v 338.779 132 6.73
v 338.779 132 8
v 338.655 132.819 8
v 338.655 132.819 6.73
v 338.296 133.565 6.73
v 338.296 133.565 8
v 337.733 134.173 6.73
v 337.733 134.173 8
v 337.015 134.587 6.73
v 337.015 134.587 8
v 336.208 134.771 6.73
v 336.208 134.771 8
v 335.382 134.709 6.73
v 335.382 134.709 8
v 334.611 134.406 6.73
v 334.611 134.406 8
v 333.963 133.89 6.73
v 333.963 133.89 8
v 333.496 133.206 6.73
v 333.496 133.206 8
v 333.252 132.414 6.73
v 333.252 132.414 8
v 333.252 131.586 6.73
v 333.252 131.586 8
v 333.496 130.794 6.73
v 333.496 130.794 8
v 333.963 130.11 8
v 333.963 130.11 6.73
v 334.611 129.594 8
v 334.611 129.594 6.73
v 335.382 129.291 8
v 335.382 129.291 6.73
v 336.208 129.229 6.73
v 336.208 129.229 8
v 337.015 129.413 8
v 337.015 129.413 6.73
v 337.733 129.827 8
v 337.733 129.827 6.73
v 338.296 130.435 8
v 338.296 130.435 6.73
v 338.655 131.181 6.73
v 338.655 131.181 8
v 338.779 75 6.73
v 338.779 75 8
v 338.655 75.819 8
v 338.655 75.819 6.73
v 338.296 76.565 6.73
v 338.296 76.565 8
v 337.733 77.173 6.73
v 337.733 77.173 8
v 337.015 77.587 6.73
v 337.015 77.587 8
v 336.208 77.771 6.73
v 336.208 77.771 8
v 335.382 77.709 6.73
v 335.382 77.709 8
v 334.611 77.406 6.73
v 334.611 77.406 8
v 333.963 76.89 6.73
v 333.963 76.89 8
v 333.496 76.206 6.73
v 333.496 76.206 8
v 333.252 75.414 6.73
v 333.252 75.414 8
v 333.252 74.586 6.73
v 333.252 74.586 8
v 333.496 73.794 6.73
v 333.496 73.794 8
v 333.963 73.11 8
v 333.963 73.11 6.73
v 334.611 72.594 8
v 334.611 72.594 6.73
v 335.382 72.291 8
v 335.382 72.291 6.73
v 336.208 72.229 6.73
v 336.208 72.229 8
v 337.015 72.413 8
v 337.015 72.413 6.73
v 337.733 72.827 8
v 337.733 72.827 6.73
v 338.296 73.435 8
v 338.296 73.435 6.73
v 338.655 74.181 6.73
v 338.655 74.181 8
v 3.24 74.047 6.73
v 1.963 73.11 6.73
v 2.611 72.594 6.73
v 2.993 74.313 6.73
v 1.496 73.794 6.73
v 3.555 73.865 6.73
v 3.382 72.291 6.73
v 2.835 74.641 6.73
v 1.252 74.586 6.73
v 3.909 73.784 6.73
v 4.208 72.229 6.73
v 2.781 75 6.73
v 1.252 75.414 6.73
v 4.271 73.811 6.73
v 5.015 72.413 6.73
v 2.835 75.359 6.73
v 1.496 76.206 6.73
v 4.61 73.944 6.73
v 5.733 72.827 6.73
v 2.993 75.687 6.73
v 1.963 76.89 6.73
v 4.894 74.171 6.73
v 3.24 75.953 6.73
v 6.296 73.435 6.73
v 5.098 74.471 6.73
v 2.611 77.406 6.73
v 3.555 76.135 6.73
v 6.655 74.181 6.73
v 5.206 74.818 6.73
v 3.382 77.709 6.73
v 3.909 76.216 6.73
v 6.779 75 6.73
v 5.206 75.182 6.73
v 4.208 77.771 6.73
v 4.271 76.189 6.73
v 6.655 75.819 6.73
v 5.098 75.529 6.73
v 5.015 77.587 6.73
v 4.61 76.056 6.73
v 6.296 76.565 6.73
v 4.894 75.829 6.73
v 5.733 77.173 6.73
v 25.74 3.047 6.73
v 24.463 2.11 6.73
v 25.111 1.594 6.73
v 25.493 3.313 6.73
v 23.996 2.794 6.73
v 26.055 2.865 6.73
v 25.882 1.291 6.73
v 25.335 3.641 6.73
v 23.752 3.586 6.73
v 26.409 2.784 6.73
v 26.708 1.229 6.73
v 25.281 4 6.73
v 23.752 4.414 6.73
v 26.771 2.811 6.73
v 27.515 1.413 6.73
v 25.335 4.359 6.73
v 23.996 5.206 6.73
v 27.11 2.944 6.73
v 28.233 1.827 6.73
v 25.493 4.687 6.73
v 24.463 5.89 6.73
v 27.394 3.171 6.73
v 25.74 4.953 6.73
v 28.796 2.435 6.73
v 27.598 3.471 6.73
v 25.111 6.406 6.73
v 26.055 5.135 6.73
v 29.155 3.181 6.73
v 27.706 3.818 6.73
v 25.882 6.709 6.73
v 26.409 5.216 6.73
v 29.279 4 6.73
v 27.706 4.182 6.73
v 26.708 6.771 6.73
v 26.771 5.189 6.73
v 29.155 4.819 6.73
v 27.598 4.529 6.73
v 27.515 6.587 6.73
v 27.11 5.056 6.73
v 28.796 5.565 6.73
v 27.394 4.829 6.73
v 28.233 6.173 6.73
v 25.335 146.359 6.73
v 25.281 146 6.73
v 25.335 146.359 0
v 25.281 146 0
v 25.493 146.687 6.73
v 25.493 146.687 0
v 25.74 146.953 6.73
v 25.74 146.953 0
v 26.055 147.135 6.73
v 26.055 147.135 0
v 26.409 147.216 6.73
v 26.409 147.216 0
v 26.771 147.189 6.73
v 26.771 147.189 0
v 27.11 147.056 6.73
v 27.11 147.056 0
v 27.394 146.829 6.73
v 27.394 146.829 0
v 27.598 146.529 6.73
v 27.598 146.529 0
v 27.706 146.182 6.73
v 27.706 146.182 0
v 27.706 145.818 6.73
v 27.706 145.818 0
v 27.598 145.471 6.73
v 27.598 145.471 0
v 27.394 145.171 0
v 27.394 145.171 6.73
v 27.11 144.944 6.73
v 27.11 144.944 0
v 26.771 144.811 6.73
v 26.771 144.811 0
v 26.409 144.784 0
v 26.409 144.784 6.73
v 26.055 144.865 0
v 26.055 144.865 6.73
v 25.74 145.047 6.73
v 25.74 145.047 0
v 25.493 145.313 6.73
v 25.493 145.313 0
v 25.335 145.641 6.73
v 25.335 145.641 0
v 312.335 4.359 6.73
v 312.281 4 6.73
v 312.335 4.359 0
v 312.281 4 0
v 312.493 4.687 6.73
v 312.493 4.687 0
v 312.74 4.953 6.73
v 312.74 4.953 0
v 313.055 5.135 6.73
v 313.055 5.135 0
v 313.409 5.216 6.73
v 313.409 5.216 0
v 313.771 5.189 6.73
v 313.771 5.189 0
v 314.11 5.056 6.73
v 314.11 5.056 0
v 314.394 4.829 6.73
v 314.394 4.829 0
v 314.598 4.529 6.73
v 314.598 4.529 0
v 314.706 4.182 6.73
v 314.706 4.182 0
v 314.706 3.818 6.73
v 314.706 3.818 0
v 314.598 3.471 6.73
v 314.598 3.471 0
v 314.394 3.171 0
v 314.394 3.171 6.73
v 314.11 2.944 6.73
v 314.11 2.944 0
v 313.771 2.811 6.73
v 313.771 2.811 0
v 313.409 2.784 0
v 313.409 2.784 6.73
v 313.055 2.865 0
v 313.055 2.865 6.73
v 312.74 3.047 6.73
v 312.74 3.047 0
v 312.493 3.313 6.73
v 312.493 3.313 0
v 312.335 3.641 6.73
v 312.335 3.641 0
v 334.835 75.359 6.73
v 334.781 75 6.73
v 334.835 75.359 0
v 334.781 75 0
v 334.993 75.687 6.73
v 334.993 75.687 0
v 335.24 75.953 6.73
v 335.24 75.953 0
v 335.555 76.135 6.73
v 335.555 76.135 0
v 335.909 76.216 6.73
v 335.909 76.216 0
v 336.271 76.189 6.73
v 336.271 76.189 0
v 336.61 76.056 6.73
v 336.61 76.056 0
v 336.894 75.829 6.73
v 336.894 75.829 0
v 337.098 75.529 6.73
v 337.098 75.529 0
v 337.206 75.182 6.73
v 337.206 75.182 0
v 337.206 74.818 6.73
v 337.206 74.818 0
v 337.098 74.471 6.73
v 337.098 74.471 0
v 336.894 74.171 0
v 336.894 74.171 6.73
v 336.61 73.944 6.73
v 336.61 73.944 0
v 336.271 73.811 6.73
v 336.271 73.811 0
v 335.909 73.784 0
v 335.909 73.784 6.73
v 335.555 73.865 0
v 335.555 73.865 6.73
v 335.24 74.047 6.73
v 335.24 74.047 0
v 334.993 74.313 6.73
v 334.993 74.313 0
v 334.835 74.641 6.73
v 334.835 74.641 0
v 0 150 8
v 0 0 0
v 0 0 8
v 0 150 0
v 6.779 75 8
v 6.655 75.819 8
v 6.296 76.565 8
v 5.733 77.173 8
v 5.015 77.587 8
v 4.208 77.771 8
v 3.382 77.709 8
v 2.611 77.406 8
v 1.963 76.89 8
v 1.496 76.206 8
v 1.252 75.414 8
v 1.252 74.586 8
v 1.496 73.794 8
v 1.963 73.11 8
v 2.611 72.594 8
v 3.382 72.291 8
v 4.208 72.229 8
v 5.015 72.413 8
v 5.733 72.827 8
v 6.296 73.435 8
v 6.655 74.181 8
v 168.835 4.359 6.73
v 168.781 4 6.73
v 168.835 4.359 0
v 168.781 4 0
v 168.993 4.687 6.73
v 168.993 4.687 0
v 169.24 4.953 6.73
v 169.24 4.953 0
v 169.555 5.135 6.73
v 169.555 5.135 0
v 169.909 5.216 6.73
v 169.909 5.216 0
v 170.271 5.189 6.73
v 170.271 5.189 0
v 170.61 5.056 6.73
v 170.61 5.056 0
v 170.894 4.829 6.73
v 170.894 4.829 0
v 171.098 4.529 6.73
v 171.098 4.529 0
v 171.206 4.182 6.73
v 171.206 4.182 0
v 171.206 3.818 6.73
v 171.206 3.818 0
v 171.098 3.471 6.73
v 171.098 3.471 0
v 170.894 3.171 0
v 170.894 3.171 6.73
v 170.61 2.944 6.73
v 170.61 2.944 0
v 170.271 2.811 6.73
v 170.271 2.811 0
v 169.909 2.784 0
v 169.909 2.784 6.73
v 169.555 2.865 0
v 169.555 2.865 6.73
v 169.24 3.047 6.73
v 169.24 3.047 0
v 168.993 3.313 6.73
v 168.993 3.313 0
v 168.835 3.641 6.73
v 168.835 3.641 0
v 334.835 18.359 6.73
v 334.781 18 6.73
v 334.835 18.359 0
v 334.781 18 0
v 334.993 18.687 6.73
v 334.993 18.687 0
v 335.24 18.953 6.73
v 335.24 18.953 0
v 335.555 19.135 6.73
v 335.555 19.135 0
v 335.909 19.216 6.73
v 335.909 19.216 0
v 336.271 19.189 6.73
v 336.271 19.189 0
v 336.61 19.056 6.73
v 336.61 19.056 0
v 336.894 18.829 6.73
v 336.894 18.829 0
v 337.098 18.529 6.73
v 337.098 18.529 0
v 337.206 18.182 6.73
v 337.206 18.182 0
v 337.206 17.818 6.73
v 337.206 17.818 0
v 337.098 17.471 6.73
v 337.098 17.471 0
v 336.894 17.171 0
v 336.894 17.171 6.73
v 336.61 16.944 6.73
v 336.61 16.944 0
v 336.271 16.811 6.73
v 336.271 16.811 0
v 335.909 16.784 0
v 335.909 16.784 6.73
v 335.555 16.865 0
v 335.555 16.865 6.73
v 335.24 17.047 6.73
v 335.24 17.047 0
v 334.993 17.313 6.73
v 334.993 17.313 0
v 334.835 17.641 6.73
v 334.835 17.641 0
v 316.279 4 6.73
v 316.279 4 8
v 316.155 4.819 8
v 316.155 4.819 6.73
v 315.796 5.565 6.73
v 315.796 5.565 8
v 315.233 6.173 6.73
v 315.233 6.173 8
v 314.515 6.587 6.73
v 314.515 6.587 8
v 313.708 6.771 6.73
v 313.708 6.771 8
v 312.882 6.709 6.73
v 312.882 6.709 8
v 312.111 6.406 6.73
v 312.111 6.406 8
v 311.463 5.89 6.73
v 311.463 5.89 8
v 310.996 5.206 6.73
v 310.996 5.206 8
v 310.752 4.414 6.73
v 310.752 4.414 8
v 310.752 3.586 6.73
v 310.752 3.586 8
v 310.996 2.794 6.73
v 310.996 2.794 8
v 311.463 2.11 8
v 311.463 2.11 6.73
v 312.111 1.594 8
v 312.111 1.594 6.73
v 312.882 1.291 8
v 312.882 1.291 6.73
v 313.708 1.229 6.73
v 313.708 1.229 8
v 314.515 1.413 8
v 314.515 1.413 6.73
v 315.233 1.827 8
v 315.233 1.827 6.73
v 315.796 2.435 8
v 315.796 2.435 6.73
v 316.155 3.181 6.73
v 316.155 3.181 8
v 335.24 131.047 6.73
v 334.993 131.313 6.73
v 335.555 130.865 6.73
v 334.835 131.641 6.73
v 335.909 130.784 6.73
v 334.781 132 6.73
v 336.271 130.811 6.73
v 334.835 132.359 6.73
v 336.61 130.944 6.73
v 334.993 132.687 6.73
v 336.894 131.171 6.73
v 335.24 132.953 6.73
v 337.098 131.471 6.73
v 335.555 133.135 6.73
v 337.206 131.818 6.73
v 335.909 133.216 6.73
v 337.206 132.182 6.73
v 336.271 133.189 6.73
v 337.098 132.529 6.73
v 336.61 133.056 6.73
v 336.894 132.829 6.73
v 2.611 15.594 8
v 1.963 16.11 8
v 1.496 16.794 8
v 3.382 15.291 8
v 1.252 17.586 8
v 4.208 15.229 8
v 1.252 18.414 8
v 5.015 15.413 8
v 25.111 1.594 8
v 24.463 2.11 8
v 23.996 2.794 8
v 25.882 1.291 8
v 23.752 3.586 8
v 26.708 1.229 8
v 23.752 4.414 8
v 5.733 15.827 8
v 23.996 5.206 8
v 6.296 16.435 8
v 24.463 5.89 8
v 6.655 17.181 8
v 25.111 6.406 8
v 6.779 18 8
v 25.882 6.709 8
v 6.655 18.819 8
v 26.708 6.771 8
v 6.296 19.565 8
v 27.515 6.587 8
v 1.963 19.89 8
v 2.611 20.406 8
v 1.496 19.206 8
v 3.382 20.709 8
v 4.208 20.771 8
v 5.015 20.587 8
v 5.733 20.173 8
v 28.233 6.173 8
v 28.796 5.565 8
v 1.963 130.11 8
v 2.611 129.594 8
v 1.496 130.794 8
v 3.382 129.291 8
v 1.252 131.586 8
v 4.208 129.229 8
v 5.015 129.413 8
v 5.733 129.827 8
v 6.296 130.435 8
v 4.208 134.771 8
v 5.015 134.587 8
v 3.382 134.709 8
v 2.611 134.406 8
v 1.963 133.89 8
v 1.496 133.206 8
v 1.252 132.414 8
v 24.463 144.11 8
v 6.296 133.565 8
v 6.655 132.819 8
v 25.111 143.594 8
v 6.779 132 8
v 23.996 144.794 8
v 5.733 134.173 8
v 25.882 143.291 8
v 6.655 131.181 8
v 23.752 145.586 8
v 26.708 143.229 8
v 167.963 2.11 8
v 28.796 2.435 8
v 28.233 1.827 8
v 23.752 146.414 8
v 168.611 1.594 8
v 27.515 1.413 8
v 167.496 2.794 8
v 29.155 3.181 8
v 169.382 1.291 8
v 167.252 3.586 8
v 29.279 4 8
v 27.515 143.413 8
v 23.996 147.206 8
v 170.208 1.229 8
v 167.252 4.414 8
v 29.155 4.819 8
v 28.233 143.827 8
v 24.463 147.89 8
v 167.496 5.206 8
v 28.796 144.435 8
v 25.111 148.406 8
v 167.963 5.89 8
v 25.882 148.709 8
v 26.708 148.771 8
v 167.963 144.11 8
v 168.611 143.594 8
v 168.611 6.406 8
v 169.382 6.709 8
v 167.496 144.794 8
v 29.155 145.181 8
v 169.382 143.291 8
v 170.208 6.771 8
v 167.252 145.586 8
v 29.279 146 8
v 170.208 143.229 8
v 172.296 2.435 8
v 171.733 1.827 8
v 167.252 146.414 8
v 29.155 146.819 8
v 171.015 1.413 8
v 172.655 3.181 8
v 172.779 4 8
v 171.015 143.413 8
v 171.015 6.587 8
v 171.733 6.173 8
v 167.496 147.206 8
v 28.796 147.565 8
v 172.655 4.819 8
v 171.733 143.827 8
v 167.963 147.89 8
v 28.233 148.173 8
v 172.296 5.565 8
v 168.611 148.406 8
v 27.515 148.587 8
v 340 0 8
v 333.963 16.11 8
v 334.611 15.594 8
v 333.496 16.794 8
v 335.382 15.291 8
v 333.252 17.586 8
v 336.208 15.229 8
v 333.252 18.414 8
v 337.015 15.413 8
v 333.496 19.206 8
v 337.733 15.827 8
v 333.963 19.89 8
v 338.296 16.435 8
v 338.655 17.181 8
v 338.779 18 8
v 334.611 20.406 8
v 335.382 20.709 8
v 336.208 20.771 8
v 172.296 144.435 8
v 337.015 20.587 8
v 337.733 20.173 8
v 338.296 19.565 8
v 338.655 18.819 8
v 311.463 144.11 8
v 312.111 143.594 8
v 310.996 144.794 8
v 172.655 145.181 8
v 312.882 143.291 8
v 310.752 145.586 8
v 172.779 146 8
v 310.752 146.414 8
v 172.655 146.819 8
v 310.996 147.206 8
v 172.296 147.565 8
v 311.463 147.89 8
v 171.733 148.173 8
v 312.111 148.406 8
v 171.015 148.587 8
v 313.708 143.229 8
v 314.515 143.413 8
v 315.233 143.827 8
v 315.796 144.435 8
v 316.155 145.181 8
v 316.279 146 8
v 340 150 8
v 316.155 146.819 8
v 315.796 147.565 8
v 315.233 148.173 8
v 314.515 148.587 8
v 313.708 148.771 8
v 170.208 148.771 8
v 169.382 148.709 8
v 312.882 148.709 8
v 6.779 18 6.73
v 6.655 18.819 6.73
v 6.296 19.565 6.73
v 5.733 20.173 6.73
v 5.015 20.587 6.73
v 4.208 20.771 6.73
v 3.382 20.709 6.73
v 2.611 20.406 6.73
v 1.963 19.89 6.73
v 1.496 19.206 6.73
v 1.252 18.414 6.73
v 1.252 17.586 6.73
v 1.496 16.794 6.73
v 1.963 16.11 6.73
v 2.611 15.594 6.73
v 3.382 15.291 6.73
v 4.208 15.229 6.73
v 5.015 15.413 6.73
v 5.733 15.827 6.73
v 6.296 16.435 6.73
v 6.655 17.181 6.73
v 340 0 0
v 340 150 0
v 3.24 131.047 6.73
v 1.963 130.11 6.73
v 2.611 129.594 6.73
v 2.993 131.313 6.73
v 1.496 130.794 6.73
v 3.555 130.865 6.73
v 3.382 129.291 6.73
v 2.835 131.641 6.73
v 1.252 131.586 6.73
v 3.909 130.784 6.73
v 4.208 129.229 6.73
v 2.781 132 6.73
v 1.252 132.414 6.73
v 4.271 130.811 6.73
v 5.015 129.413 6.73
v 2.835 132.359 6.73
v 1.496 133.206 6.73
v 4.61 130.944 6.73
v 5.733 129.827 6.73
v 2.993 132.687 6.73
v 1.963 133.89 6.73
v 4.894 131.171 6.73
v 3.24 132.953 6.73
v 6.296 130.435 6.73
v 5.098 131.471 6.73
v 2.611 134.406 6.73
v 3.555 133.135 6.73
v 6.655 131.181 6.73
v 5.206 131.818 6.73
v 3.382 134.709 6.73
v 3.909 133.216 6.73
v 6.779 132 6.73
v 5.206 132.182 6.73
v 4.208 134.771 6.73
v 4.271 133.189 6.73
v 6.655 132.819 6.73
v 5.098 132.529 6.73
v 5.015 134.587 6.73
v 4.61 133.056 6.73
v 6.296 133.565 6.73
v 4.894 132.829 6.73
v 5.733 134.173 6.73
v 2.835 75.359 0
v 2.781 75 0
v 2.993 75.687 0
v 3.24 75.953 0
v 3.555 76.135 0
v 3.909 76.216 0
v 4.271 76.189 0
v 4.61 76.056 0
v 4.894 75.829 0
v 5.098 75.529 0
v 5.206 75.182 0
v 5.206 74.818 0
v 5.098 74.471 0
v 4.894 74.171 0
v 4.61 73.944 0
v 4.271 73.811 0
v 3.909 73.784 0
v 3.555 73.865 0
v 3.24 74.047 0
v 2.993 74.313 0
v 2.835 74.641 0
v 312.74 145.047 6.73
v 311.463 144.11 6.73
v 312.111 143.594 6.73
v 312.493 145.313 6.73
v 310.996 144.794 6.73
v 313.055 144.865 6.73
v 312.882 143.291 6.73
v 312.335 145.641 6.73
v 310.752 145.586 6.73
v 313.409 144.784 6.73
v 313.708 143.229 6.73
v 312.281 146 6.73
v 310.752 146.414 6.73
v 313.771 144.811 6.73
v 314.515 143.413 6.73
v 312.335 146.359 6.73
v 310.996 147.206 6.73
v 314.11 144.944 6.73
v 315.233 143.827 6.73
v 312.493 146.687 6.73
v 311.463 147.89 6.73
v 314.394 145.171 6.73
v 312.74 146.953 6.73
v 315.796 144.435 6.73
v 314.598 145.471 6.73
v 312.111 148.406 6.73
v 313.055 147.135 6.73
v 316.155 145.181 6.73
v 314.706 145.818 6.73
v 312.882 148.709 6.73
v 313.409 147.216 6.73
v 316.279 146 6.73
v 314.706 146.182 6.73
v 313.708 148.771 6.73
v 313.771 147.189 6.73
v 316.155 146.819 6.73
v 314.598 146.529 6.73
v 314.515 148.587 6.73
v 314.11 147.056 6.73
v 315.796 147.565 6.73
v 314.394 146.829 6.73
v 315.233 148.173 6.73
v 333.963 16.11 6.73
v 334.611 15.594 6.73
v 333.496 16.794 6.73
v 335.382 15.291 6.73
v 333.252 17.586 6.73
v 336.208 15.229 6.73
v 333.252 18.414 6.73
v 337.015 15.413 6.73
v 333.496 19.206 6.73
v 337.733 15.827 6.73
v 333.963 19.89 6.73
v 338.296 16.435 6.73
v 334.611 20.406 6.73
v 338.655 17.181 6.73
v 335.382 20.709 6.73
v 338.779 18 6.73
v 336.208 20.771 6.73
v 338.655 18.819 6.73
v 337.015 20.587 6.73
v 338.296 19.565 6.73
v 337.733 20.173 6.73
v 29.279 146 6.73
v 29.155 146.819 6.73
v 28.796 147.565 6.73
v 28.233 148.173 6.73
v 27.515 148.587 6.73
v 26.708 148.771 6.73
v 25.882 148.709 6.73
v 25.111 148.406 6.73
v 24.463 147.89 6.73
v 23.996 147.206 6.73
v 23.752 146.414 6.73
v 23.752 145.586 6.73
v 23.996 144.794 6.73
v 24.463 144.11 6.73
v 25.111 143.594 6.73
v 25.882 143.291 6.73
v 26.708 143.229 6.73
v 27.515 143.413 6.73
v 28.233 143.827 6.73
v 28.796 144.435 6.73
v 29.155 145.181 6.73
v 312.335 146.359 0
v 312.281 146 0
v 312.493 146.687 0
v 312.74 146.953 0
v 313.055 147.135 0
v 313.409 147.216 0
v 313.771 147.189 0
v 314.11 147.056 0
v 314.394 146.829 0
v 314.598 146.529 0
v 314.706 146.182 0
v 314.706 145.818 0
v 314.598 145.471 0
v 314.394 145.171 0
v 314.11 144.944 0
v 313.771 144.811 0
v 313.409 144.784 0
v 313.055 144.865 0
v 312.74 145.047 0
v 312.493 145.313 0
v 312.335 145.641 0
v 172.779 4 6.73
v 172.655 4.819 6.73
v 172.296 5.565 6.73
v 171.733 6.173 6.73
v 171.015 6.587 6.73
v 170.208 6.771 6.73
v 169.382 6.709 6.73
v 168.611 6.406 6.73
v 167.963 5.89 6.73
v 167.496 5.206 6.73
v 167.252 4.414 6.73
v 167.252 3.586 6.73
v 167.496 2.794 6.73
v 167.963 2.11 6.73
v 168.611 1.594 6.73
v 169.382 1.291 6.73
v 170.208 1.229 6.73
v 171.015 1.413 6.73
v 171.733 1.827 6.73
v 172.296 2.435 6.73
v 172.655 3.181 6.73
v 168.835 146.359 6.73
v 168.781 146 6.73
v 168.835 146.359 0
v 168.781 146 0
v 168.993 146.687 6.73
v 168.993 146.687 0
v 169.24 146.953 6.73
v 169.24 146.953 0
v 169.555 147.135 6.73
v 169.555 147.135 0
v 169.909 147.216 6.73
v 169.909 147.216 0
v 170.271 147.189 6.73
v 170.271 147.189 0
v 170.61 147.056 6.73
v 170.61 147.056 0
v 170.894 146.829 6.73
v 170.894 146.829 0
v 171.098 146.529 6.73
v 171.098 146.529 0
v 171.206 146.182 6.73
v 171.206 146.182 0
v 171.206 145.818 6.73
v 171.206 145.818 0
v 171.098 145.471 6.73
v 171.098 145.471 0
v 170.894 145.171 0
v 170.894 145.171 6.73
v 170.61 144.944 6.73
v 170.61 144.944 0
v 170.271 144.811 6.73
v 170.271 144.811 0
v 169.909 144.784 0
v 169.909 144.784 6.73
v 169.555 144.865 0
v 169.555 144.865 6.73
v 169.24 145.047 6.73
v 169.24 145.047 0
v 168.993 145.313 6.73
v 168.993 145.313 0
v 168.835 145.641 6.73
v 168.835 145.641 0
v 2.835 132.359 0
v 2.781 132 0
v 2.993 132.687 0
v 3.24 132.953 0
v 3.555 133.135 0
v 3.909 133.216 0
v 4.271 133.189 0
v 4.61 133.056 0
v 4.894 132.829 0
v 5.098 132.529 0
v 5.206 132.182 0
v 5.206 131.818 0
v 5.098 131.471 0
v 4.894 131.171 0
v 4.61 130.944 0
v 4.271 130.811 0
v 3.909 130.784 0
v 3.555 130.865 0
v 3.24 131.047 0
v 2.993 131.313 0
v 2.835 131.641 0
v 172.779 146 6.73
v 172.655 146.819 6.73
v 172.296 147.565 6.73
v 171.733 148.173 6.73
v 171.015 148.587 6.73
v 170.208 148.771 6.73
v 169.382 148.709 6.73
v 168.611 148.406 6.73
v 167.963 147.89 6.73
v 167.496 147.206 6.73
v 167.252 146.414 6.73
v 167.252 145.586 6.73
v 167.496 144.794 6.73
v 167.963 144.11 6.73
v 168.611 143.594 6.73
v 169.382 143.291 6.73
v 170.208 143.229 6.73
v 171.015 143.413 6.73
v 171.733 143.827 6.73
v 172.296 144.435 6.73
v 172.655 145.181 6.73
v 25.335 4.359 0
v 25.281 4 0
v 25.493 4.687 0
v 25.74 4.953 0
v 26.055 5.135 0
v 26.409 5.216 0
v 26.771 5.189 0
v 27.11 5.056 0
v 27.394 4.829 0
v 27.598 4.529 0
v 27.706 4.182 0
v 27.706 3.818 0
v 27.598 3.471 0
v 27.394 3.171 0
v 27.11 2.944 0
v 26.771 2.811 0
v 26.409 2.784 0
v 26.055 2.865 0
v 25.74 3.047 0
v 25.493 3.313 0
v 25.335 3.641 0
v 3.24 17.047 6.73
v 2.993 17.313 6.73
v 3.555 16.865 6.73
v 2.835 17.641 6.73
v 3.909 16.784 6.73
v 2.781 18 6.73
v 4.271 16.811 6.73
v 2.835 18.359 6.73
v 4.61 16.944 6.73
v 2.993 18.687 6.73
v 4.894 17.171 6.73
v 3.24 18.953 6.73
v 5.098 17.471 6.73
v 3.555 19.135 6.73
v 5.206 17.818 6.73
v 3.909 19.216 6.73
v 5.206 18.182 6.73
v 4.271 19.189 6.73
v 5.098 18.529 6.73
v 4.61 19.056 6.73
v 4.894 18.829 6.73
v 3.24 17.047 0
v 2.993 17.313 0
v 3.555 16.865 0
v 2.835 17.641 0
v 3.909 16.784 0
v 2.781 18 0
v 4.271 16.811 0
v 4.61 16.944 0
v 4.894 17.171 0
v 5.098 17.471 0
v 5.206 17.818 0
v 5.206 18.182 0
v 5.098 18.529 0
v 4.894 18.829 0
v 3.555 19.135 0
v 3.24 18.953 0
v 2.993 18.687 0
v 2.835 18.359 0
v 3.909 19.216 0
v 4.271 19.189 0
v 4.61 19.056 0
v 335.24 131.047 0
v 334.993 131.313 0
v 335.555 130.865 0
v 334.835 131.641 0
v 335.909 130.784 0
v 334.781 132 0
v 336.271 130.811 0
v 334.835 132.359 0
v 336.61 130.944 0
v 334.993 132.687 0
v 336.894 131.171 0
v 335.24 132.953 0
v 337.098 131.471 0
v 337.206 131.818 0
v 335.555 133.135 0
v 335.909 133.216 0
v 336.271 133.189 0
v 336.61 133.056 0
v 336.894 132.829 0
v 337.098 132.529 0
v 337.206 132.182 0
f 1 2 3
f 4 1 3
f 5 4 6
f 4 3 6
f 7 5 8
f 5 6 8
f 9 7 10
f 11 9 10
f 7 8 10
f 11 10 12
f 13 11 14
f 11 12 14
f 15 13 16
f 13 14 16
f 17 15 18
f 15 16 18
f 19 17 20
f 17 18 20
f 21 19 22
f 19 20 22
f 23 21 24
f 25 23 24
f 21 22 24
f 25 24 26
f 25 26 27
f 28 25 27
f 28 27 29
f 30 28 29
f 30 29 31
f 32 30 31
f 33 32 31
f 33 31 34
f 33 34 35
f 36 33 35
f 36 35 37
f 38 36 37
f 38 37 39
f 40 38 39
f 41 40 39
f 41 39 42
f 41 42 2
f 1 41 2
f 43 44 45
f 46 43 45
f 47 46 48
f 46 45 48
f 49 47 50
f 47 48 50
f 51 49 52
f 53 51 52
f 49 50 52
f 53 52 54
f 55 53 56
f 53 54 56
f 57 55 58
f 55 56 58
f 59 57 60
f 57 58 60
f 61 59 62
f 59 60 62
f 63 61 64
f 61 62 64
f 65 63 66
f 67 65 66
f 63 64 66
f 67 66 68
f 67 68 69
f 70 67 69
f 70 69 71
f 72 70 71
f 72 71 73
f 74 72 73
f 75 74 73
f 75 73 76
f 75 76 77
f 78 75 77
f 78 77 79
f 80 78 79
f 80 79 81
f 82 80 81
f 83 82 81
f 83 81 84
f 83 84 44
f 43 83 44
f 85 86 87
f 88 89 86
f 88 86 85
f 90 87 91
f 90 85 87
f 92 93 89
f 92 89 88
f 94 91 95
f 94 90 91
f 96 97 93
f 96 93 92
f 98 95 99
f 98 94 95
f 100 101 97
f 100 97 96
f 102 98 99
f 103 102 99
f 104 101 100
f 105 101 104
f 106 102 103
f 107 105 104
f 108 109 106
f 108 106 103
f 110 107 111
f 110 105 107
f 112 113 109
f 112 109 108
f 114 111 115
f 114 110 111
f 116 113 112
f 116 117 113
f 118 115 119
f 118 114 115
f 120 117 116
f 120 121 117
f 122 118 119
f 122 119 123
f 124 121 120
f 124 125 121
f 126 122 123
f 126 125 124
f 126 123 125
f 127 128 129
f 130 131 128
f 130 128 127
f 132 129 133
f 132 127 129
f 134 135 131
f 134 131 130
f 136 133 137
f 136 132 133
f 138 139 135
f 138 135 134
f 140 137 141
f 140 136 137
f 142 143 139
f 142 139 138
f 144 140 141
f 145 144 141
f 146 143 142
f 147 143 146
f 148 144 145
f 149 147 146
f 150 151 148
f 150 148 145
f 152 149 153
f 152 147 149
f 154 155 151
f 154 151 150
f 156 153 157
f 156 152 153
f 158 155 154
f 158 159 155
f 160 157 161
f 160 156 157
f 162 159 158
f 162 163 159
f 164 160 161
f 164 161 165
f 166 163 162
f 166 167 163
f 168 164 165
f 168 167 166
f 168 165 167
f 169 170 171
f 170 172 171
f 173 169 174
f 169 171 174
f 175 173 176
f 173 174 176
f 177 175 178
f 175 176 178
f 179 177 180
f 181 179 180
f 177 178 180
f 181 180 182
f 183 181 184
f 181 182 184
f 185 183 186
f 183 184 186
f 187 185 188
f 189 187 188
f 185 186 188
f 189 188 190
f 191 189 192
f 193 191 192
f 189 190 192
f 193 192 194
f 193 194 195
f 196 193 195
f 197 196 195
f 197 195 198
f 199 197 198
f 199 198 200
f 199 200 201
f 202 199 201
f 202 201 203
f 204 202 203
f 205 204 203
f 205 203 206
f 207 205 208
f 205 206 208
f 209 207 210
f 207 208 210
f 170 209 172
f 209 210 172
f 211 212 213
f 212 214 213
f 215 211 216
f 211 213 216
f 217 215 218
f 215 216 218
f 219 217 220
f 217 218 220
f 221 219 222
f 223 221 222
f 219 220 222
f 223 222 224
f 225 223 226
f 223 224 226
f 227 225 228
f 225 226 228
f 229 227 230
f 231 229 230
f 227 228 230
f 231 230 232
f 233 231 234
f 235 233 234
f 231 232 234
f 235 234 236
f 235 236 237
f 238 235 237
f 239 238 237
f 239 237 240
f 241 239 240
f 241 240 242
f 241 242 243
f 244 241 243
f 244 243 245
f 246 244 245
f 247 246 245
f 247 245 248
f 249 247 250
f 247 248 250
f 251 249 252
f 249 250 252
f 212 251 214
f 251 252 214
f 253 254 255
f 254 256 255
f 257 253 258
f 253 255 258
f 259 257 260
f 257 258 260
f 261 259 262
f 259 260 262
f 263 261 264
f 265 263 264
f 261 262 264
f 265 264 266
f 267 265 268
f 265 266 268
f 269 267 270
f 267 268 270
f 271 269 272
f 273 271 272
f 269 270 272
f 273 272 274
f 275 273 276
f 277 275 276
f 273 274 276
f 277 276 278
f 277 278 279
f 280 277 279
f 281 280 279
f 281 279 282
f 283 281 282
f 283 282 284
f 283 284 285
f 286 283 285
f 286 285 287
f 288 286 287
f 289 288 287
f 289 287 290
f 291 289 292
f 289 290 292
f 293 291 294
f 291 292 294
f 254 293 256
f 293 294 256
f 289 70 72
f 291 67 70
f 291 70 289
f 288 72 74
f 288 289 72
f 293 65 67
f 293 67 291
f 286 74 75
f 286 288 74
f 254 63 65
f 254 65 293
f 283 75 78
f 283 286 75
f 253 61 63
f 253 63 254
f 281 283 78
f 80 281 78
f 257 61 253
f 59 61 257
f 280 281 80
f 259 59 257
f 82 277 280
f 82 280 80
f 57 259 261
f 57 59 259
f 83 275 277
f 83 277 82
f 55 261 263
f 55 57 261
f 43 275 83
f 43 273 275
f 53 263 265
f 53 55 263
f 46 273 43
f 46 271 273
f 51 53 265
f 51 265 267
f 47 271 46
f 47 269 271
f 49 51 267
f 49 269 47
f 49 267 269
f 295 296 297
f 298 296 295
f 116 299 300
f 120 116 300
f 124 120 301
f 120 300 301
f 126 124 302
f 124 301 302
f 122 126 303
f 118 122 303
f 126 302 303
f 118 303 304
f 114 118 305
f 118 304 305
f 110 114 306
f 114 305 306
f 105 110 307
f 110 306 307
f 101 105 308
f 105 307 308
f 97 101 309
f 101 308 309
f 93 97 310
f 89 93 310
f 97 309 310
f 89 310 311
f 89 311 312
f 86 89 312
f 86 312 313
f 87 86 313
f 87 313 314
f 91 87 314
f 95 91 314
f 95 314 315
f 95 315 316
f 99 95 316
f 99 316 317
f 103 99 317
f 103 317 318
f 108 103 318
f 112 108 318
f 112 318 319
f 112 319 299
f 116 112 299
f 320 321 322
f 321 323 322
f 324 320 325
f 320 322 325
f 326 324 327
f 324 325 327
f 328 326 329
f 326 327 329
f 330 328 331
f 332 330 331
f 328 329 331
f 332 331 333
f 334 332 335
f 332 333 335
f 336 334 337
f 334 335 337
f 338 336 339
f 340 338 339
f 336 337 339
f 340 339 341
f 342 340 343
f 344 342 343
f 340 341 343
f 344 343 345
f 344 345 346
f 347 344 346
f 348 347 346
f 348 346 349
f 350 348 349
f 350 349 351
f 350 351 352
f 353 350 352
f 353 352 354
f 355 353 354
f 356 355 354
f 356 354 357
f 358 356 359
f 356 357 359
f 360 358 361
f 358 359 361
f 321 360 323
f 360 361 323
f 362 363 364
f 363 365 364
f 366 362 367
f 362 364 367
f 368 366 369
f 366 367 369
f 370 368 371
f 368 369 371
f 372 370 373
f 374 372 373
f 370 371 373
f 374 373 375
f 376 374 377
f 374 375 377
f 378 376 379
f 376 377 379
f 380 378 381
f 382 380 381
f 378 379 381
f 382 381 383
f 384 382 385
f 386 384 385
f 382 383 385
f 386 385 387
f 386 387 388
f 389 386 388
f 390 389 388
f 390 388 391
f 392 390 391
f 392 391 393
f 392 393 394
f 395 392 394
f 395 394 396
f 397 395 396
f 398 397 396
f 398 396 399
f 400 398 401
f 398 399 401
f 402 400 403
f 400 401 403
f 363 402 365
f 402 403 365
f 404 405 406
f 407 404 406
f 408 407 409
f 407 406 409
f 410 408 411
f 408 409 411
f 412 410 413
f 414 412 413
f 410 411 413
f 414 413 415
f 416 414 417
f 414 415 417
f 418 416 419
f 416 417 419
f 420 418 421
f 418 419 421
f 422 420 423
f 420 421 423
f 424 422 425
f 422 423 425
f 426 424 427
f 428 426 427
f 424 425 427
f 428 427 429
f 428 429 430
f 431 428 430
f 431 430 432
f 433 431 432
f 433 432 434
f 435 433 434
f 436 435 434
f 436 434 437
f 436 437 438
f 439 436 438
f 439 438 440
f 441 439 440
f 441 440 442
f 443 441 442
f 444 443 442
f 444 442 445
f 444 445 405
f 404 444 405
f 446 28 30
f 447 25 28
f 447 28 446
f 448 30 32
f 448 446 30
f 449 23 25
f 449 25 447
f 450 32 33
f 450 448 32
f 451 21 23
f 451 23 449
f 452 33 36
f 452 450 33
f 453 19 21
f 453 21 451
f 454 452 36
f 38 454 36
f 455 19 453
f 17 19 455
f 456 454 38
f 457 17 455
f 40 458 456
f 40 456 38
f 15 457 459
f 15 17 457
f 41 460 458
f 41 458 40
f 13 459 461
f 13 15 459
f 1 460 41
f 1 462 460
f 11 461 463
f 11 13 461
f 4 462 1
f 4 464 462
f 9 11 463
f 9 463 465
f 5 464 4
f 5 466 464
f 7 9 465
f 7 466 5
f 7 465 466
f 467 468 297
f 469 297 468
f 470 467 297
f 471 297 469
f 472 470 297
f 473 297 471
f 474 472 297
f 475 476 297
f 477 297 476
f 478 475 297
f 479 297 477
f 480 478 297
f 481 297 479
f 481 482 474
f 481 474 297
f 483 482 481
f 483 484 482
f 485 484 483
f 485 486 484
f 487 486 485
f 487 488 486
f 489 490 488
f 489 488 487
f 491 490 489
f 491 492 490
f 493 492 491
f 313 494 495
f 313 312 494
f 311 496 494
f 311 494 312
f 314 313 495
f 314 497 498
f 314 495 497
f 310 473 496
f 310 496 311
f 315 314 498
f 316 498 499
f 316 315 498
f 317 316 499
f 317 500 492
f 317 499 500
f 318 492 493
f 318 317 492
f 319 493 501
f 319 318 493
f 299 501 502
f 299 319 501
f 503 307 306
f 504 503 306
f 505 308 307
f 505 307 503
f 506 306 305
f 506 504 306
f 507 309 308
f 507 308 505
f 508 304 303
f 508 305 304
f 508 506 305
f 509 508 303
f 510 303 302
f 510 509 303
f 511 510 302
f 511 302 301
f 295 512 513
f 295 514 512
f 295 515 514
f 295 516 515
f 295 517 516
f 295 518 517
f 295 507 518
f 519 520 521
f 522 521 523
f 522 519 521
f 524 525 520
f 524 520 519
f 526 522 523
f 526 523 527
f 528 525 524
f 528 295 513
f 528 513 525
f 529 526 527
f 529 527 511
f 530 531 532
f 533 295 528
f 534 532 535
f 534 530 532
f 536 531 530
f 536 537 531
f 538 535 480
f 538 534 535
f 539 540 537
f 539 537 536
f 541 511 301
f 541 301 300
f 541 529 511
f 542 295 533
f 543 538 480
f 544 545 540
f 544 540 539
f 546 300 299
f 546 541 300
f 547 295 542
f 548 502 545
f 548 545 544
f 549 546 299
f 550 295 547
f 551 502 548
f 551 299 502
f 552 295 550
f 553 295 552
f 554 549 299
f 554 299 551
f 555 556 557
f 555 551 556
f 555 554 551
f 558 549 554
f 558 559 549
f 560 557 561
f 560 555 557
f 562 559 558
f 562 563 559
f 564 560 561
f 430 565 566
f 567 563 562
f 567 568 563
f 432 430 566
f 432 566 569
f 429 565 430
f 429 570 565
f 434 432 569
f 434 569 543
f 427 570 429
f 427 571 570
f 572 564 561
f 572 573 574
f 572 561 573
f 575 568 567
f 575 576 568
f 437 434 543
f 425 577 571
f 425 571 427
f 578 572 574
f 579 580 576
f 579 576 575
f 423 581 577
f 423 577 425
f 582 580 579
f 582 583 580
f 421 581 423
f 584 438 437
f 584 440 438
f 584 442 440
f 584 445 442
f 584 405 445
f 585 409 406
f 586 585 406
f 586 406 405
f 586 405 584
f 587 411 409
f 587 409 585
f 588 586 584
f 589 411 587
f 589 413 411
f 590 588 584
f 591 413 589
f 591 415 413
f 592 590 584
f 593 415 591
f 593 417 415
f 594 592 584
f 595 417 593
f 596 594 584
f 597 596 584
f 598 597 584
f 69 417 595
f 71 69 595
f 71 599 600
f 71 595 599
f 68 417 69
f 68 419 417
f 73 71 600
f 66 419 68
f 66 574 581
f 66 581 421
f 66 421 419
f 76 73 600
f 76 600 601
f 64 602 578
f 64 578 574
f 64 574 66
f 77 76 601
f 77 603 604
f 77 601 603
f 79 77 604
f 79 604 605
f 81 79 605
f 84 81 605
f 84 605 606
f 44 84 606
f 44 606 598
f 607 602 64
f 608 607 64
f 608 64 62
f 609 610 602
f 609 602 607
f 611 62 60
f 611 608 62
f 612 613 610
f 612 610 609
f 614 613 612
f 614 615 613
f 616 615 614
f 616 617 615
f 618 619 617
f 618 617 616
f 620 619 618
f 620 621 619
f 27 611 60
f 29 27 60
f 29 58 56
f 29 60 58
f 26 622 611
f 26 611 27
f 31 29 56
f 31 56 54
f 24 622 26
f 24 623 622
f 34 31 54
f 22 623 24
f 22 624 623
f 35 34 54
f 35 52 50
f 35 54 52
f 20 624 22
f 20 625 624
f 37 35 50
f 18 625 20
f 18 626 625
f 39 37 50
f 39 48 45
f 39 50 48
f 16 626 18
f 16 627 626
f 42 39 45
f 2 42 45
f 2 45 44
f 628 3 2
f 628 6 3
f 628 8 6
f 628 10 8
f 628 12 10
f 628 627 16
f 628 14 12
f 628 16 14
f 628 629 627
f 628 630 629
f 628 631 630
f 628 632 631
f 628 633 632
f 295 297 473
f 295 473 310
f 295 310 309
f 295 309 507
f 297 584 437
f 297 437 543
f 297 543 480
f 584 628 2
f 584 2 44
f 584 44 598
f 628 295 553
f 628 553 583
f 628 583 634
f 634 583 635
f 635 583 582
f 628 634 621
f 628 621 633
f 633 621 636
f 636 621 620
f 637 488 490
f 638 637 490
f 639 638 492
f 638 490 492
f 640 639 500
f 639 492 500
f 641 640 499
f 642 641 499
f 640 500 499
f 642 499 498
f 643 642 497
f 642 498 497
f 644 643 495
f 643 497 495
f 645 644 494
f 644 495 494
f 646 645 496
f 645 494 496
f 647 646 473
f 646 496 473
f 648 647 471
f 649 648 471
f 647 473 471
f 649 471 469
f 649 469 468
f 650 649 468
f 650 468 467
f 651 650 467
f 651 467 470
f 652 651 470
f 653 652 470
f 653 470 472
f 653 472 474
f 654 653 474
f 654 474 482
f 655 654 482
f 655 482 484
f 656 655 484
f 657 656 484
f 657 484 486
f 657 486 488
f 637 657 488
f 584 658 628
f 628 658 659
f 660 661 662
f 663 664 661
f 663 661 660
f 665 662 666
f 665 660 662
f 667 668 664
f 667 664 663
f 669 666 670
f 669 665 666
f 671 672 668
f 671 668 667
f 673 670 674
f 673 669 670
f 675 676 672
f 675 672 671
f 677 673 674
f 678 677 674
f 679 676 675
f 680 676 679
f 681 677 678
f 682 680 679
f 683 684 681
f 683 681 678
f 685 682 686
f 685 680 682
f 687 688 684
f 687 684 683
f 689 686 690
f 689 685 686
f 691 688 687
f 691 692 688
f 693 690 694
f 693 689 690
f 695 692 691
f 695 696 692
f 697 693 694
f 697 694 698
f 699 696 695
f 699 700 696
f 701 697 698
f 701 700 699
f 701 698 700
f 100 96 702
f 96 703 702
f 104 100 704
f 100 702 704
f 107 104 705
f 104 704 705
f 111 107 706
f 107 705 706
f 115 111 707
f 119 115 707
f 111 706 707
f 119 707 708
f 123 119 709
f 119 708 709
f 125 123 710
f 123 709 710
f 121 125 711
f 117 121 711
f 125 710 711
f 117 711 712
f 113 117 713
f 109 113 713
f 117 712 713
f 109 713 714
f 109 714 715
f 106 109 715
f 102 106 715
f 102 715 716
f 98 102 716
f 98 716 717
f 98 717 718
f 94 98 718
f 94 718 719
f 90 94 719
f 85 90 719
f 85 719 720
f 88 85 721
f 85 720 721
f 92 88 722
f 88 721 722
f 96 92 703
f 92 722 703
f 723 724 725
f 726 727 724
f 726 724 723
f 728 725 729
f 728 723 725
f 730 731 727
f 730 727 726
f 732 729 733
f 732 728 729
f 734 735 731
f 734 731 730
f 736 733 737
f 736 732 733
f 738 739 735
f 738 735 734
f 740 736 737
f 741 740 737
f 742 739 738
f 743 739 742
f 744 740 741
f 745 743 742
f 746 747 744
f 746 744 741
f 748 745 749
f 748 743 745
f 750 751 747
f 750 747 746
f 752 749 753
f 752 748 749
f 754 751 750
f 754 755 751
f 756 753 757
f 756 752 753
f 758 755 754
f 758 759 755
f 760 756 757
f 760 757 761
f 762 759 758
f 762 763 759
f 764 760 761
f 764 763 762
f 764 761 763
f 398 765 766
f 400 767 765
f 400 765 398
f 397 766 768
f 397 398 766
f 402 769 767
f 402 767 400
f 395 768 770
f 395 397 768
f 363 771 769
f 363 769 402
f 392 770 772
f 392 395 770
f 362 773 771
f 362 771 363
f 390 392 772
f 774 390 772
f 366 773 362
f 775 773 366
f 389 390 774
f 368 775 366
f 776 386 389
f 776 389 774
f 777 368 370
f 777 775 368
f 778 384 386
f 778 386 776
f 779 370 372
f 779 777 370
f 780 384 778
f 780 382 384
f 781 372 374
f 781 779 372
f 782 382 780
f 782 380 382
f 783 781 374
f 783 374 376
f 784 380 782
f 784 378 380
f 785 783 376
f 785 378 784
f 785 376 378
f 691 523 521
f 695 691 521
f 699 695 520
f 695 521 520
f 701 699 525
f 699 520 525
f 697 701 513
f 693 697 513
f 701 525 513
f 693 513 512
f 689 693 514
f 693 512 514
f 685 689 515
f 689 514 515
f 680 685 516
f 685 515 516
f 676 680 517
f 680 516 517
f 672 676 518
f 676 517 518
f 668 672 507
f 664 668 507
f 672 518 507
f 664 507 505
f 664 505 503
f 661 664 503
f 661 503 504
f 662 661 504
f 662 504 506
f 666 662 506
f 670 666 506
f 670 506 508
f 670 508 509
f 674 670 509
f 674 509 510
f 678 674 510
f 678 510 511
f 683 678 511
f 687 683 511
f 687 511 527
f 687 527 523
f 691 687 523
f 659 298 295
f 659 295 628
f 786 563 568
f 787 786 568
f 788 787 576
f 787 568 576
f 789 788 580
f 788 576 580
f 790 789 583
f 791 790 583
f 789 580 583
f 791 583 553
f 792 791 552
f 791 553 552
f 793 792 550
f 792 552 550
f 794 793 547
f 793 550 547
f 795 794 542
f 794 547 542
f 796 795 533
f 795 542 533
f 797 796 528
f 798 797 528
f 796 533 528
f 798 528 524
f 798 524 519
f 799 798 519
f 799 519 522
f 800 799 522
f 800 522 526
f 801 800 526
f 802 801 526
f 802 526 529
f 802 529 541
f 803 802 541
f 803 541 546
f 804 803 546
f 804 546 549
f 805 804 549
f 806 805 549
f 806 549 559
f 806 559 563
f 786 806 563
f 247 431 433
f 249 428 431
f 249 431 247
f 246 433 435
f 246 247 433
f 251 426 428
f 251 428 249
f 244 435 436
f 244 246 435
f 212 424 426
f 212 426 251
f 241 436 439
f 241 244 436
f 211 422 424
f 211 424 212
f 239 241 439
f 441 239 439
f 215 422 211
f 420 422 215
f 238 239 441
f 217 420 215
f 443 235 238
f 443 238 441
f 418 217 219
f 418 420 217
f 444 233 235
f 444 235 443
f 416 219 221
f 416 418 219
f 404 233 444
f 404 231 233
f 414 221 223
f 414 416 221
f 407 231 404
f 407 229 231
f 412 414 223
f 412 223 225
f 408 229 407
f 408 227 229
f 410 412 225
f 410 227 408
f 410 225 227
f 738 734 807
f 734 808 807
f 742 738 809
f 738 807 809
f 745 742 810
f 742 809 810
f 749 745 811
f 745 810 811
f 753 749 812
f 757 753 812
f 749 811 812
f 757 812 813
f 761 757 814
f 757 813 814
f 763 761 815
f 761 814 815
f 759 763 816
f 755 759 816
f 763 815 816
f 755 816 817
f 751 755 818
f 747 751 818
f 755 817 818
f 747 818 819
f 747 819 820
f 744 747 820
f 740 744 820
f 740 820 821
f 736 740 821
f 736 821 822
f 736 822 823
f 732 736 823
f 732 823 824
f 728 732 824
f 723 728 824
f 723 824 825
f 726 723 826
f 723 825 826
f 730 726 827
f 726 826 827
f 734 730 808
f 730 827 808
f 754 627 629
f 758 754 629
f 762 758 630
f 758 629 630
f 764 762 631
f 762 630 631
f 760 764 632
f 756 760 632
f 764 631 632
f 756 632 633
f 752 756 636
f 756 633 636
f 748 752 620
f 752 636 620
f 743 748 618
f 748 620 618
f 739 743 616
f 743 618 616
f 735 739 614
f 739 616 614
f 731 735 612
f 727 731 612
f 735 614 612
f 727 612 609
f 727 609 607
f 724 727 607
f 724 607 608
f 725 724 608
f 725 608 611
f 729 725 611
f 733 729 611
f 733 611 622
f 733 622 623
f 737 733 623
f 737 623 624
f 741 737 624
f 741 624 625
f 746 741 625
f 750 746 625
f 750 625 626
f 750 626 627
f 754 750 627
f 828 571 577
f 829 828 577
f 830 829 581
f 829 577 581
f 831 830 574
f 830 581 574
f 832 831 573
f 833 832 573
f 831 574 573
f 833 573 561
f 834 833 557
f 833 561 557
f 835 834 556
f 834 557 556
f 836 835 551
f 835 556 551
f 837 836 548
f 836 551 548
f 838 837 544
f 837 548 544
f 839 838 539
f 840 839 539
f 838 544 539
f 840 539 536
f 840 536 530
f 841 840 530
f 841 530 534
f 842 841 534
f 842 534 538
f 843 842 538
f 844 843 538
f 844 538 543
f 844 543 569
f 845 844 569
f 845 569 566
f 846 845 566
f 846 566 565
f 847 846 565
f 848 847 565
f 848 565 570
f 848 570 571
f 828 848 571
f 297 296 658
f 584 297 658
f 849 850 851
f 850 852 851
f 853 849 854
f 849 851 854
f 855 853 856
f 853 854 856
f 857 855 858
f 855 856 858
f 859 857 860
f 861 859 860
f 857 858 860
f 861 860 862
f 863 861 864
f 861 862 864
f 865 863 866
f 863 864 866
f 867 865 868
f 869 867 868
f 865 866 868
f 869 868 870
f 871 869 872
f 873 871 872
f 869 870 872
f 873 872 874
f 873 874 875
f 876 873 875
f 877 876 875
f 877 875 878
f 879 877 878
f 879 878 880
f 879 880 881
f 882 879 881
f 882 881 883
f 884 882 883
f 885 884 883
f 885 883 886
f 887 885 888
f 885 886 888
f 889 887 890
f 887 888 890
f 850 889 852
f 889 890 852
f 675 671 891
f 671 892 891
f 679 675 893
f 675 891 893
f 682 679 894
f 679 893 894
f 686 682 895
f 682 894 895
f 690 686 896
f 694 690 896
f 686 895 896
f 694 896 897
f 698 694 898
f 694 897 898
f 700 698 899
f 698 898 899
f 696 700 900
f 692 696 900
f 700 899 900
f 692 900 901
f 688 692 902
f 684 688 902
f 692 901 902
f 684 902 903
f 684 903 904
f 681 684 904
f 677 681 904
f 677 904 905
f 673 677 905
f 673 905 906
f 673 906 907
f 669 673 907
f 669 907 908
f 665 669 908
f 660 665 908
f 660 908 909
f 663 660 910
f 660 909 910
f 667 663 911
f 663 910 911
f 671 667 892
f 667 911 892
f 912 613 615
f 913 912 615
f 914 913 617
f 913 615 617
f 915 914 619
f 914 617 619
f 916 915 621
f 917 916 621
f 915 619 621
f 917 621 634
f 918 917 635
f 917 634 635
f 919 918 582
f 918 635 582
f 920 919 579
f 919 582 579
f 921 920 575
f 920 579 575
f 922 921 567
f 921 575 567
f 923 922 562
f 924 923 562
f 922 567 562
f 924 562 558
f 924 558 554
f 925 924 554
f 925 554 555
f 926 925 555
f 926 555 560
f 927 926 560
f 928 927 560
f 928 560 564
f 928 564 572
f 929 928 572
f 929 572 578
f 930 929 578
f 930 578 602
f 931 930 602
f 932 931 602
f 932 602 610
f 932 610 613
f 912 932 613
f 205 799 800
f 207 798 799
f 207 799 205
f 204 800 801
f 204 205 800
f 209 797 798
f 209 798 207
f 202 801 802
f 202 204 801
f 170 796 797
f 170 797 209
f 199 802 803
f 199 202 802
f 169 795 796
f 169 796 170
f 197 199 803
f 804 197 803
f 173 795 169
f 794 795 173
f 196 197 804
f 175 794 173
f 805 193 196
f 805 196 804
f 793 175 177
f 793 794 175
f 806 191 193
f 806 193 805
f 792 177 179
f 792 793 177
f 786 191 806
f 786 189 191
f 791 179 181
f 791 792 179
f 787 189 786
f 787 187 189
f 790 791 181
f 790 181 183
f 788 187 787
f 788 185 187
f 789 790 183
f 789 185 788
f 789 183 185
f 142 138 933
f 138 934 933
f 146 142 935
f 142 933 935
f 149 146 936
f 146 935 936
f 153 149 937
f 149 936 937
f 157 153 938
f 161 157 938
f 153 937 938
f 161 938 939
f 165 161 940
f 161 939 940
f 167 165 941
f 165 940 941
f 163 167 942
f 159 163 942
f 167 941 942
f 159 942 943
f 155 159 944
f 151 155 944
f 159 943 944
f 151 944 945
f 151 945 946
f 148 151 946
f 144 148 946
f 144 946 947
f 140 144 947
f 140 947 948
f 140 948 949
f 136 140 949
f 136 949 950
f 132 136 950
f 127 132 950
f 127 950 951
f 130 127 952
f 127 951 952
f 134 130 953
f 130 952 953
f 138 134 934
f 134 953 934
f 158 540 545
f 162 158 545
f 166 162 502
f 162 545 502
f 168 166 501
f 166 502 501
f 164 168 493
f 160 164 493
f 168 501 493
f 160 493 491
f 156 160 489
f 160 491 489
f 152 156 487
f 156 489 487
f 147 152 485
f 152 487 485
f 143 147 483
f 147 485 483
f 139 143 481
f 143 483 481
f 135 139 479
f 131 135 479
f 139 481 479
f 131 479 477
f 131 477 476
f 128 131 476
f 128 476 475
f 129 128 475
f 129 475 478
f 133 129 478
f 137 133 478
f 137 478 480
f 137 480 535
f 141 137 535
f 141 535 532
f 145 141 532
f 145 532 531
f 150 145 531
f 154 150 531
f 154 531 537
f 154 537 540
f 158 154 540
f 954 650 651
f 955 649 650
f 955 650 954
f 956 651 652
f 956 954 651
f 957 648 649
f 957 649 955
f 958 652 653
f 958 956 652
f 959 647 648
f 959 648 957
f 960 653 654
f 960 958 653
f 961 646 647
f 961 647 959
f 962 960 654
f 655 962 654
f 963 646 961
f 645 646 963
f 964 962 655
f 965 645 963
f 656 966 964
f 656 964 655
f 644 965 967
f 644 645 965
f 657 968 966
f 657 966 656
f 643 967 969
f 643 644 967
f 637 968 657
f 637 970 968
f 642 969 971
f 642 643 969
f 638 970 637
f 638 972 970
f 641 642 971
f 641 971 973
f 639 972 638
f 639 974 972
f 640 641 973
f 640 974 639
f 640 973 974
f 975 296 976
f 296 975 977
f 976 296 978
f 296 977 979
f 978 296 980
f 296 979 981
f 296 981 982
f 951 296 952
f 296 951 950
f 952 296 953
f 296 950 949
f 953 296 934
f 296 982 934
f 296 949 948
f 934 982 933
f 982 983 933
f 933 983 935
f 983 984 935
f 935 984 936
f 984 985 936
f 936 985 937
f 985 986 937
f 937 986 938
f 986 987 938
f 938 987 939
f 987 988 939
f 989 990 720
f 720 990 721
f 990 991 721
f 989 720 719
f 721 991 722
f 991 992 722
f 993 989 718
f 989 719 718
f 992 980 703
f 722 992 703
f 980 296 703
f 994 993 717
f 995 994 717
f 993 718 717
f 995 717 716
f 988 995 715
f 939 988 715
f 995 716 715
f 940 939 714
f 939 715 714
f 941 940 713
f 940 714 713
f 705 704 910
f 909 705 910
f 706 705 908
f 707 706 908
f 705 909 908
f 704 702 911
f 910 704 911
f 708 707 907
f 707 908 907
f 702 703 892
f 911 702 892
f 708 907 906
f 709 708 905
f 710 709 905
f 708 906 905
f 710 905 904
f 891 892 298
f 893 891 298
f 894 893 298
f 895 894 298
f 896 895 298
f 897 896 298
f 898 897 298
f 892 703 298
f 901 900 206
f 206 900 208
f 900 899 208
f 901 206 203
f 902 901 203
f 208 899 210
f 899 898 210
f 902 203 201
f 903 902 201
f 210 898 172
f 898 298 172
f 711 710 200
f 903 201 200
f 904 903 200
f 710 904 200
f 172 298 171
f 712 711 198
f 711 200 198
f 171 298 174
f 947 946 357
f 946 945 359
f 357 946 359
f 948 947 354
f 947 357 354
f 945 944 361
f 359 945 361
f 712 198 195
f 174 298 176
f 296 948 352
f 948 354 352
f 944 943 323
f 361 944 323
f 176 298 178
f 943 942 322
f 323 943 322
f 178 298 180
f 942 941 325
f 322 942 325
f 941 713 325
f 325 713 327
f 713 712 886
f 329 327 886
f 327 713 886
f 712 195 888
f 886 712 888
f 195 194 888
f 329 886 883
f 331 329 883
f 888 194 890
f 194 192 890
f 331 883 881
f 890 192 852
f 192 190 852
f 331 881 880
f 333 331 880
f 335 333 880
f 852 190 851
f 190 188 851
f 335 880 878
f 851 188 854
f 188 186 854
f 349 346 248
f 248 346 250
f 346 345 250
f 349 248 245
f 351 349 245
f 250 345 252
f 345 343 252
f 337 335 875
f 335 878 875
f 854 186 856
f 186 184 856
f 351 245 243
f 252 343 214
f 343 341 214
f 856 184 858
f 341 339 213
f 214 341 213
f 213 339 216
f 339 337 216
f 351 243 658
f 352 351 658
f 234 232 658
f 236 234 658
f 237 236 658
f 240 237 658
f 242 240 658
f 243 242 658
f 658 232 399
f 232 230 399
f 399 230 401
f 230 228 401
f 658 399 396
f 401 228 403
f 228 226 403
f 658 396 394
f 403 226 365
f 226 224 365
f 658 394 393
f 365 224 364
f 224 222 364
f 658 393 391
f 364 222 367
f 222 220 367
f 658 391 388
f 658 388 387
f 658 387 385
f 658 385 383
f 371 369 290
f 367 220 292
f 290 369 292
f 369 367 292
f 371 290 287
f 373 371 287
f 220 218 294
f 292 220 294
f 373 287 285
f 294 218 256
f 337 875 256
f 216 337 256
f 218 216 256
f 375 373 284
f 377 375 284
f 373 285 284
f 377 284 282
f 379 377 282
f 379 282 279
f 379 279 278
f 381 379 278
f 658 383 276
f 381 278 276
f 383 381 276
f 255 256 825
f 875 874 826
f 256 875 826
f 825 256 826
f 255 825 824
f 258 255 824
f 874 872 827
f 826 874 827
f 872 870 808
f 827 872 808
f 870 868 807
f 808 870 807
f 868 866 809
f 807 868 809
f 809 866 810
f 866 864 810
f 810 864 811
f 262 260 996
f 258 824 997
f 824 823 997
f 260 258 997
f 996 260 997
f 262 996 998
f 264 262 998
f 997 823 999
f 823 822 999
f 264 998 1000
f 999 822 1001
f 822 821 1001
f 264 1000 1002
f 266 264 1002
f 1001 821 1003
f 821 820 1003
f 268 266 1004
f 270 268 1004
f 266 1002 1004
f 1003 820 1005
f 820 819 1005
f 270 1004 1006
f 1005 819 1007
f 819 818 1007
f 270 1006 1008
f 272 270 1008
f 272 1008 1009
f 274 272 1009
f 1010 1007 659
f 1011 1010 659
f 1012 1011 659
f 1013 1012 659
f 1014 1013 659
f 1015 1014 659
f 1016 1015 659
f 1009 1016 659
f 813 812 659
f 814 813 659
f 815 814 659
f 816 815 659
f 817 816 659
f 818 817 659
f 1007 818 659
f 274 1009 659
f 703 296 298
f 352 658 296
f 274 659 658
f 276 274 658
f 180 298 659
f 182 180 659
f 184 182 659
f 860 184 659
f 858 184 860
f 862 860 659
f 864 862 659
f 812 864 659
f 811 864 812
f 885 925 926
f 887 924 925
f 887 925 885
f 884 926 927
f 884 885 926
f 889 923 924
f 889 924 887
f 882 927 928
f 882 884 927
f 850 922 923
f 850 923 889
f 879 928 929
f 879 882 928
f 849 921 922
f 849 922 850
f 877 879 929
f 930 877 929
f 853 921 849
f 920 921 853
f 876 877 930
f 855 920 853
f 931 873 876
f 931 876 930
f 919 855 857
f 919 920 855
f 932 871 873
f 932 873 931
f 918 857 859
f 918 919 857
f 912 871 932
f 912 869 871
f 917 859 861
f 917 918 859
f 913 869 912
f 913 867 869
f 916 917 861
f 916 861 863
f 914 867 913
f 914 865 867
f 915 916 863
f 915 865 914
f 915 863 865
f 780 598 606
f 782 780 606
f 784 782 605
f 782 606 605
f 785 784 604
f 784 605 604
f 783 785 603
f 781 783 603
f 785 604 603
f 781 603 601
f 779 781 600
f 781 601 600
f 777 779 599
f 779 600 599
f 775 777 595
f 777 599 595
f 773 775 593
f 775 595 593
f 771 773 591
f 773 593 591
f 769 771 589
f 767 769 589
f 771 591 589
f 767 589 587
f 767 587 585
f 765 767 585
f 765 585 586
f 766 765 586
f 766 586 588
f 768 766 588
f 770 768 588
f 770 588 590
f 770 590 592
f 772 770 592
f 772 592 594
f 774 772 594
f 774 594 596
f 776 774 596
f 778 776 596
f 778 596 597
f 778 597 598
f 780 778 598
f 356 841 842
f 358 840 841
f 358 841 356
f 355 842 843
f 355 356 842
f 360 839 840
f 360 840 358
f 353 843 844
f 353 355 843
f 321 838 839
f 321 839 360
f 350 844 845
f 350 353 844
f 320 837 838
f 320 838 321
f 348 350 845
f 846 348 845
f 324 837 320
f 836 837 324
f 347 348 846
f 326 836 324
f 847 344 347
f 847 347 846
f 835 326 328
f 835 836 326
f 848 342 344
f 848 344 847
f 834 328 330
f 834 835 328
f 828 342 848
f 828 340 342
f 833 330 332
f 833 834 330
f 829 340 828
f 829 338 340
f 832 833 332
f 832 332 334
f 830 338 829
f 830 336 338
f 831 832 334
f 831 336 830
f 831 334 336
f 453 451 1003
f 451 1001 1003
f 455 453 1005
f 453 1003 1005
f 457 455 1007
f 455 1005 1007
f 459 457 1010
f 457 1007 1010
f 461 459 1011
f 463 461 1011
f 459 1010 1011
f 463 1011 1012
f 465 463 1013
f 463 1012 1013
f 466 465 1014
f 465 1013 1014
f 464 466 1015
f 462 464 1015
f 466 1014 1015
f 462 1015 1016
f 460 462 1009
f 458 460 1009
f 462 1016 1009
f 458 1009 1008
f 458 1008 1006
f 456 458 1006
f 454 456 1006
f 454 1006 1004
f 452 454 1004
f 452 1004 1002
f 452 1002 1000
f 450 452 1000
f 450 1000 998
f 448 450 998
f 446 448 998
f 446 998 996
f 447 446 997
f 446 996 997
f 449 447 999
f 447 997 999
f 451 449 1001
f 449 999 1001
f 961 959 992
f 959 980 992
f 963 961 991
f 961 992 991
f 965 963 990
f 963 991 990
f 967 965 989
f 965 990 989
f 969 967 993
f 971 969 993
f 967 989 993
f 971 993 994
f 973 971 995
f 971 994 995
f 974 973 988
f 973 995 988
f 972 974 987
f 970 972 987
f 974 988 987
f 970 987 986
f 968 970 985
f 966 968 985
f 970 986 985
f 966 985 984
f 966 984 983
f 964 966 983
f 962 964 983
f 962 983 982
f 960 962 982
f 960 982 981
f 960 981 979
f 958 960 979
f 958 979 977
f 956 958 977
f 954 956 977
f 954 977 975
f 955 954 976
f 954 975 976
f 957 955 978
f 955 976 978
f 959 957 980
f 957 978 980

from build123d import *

# Parameters (mm, degrees)
SKETCH1_W                                           = 340
SKETCH1_H                                           = 150
BOSS_EXTRUDE1_DEPTH                                 = 8
CBORE_FOR_2_BINDING_HEAD_MACHINE_SCREW1_D           = 2.4384
CBORE_FOR_2_BINDING_HEAD_MACHINE_SCREW1_DEPTH       = 20
CBORE_FOR_2_BINDING_HEAD_MACHINE_SCREW1_CBORE_D     = 5.55752
CBORE_FOR_2_BINDING_HEAD_MACHINE_SCREW1_CBORE_DEPTH = 1.27
CBORE_FOR_2_BINDING_HEAD_MACHINE_SCREW1_TIP         = 0.732569267


with BuildPart() as part:
    # Sketch1 → Boss-Extrude1 (new body)
    with BuildSketch(Plane.XY):
        with Locations((170, 75)):
            Rectangle(SKETCH1_W, SKETCH1_H)
    extrude(amount=BOSS_EXTRUDE1_DEPTH)

    # CBORE for #2 Binding Head Machine Screw1
    with Locations(Plane.XY.offset(8)):
        with Locations((4, 132), (4, 75), (4, 18), (26.5, 4), (170, 4), (313.5, 4), (336, 18), (336, 75), (336, 132), (313.5, 146), (170, 146), (26.5, 146)):
            CounterBoreHole(CBORE_FOR_2_BINDING_HEAD_MACHINE_SCREW1_D / 2, CBORE_FOR_2_BINDING_HEAD_MACHINE_SCREW1_CBORE_D / 2, CBORE_FOR_2_BINDING_HEAD_MACHINE_SCREW1_CBORE_DEPTH, depth=CBORE_FOR_2_BINDING_HEAD_MACHINE_SCREW1_DEPTH)
            with Locations((0, 0, -(CBORE_FOR_2_BINDING_HEAD_MACHINE_SCREW1_DEPTH + CBORE_FOR_2_BINDING_HEAD_MACHINE_SCREW1_TIP / 2))):  # 118° drill point
                Cone(0, CBORE_FOR_2_BINDING_HEAD_MACHINE_SCREW1_D / 2, CBORE_FOR_2_BINDING_HEAD_MACHINE_SCREW1_TIP, mode=Mode.SUBTRACT)


solid = part.part
